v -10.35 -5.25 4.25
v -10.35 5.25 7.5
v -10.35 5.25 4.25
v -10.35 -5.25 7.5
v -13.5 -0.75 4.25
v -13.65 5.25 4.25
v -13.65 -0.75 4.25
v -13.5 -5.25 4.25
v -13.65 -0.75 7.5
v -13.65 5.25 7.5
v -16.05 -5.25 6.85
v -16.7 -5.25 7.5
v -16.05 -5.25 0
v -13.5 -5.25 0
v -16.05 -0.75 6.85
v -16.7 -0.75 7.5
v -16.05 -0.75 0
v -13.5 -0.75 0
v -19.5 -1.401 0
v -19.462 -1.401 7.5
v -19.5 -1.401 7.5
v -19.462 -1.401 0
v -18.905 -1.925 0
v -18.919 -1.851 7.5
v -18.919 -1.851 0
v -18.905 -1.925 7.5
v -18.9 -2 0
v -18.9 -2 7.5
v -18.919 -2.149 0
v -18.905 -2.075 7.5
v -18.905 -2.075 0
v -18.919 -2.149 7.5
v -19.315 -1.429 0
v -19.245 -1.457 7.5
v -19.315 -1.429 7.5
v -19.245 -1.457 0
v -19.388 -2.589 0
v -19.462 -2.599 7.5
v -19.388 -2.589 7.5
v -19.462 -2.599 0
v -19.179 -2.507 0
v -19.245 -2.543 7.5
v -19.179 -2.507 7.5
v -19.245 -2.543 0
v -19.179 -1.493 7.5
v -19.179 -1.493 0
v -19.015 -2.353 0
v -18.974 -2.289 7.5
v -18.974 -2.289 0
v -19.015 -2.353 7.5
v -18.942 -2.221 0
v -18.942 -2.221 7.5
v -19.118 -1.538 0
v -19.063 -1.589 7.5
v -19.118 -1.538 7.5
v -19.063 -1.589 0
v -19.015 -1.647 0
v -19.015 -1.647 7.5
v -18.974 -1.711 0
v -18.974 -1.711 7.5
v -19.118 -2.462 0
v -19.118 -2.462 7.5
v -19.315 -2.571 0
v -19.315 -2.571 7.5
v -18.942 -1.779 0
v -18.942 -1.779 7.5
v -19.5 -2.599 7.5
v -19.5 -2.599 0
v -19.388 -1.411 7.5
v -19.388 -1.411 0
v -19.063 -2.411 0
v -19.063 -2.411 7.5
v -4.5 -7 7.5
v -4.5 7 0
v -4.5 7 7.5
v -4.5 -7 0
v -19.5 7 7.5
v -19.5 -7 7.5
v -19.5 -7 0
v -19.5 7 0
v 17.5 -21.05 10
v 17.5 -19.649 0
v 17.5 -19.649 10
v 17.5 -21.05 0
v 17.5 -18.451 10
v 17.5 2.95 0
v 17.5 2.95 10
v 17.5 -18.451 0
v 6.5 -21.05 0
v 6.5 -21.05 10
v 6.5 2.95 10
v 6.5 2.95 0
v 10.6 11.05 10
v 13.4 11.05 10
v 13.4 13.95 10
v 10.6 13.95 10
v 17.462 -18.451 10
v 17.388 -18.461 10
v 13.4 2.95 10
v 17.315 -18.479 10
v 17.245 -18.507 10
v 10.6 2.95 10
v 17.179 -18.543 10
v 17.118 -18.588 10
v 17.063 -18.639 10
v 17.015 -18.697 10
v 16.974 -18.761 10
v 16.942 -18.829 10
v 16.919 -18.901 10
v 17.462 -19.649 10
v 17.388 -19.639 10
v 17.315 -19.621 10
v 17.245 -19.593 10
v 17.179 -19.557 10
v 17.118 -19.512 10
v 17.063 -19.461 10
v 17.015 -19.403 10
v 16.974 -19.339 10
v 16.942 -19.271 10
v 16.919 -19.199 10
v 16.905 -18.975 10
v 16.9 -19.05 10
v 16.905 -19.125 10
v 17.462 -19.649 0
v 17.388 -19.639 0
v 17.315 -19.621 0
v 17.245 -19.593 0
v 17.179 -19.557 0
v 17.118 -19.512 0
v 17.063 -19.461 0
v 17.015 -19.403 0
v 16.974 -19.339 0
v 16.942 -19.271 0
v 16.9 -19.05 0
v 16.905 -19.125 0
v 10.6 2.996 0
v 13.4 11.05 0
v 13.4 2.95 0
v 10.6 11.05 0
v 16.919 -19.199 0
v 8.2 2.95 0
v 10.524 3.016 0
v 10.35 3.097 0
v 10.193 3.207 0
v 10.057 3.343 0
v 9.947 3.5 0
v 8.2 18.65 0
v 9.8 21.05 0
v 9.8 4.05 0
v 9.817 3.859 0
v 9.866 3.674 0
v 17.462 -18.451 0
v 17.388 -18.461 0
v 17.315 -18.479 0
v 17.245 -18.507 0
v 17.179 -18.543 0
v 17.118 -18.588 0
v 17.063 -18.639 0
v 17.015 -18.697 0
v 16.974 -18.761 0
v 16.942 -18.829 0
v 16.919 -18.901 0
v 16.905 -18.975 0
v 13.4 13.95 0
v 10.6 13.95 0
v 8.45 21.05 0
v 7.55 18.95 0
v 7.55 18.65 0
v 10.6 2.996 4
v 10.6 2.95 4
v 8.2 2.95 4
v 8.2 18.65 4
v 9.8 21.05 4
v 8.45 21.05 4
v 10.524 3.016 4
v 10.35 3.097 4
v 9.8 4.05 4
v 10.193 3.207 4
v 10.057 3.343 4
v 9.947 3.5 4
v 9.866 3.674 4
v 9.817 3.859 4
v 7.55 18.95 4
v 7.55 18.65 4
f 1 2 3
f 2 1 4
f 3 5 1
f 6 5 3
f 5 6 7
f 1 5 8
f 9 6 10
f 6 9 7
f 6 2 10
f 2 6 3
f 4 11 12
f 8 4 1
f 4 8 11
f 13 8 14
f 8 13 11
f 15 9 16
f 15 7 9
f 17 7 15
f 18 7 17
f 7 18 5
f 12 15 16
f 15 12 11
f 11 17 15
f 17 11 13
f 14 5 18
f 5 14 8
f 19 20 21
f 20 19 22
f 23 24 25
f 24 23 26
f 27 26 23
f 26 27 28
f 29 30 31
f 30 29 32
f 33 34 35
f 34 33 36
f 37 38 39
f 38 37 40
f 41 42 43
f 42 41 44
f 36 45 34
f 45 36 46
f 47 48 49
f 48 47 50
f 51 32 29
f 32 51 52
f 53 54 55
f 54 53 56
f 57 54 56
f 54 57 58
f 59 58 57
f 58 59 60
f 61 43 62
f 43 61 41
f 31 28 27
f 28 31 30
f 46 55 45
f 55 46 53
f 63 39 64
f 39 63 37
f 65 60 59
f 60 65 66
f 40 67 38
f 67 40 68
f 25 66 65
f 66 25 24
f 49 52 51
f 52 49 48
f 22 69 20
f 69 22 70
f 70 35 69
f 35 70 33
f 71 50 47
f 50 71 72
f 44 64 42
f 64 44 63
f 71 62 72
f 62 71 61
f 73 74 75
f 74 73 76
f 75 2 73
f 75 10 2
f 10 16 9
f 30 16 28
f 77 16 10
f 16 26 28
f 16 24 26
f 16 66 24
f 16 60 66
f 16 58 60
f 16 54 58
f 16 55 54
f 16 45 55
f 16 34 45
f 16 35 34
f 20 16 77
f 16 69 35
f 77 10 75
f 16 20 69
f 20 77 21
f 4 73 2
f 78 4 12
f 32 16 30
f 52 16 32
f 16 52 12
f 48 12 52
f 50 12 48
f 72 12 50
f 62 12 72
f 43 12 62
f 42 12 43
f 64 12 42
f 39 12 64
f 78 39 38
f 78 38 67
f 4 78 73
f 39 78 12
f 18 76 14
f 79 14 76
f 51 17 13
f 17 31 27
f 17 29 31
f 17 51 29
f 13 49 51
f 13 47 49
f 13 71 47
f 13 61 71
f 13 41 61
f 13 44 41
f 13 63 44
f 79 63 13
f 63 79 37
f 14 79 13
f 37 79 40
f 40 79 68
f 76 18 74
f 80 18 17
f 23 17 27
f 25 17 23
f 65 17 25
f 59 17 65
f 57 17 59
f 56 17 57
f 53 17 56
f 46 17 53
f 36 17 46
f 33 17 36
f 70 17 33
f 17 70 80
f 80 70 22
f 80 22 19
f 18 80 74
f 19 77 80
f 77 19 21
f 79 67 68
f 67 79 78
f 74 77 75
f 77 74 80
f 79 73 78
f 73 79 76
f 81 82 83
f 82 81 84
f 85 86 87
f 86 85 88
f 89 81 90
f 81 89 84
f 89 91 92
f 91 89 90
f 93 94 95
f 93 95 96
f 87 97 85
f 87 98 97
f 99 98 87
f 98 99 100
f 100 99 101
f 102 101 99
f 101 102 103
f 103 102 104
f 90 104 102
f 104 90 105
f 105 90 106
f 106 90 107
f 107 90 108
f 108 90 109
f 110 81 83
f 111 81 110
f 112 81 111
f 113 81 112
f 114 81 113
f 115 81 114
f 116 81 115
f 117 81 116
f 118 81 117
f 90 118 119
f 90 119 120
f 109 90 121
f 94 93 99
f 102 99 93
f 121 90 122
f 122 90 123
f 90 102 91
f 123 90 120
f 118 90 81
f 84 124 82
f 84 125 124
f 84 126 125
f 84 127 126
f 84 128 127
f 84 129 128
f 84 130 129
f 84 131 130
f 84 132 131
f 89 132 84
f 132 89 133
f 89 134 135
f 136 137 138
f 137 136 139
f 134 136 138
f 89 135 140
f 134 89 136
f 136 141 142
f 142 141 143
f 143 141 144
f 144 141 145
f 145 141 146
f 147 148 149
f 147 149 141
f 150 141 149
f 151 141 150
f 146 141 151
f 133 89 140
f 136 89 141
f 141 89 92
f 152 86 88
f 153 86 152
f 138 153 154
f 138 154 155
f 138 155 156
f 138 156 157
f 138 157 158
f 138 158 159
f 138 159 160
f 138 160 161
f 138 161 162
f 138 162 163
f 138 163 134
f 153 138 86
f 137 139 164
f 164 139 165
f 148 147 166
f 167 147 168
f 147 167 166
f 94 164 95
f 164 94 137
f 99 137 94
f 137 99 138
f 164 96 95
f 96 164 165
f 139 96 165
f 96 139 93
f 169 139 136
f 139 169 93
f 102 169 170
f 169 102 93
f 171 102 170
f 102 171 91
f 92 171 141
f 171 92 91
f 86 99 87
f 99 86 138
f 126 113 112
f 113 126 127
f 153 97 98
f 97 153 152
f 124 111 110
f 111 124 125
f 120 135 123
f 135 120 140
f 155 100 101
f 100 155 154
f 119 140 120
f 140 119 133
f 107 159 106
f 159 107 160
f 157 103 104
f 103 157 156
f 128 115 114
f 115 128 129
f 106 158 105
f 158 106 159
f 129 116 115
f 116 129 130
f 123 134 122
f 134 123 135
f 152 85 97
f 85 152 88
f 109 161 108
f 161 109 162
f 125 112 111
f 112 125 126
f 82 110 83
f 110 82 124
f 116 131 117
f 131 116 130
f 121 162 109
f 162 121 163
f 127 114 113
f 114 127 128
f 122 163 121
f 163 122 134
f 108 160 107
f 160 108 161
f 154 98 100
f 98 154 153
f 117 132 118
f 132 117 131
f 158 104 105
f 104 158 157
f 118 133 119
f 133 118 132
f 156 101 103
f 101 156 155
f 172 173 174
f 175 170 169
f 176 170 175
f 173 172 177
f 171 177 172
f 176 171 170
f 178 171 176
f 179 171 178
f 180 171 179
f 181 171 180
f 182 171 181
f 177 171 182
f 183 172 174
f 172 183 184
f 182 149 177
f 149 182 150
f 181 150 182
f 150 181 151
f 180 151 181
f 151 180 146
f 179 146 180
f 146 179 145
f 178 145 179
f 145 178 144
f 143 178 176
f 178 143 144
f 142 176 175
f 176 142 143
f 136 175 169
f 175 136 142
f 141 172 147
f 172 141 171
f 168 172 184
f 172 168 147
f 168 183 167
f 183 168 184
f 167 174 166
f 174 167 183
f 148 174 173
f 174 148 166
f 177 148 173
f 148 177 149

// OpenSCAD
$fn = 50;

difference() {
	union() {
		translate(v = [-12, -5, 0]) {
			rotate(a = [0, 0, 0]) {
				difference() {
					union() {
						translate(v = [-7.5, -2.0, 0]) {
							cube(size = [15.0, 14.0, 7.5]);
						}
					}
					union() {
						translate(v = [-1.65, -0.25, 4.25]) {
							cube(size = [3.3, 10.5, 3.35]);
						}
						translate(v = [0, 4.25, 0]) {
							rotate(a = [90, 0, 0]) {
								linear_extrude(height = 4.5) {
									polygon(points = [[-1.5, -0.1], [-4.05, -0.1], [-4.05, 6.85], [-4.8, 7.6], [-0.75, 7.6], [-1.5, 6.85]]);
								}
							}
						}
						translate(v = [-7.5, 3, -0.1]) {
							cylinder(h = 7.7, r = 0.6);
						}
					}
				}
			}
		}
		translate(v = [12, 10.95, 0]) {
			rotate(a = [90, 0, 0]) {
				union() {
					difference() {
						union() {
							translate(v = [-5.5, 0, 0]) {
								cube(size = [11.0, 10.0, 32.0]);
							}
							translate(v = [-1.4, 0, -3.0]) {
								cube(size = [2.8, 10.0, 3.1]);
							}
						}
						union() {
							translate(v = [-5.6, -0.1, -0.1]) {
								cube(size = [4.199999999999999, 10.2, 8.1]);
							}
							translate(v = [1.4, -0.1, -0.1]) {
								cube(size = [4.199999999999999, 10.2, 8.1]);
							}
							translate(v = [5.5, 10.1, 30.0]) {
								rotate(a = [90, 0, 0]) {
									cylinder(h = 10.2, r = 0.6);
								}
							}
						}
					}
					union() {
						translate(v = [0, 4.0, 0]) {
							rotate(a = [90, 0, 0]) {
								linear_extrude(height = 4.0) {
									polygon(points = [[-2.2, -10.1], [-3.55, -10.1], [-4.45, -8.0], [-4.45, -7.7], [-3.8, -7.7], [-3.8, 8.5], [-1.1, 8.5], [-1.1, 8.0], [-1.291013, 7.983289], [-1.476222, 7.933662], [-1.65, 7.852628], [-1.807066, 7.742649], [-1.942649, 7.607066], [-2.052628, 7.45], [-2.133662, 7.276222], [-2.183289, 7.091013], [-2.2, 6.9]]);
								}
							}
						}
					}
				}
			}
		}
	}
	union();
}
